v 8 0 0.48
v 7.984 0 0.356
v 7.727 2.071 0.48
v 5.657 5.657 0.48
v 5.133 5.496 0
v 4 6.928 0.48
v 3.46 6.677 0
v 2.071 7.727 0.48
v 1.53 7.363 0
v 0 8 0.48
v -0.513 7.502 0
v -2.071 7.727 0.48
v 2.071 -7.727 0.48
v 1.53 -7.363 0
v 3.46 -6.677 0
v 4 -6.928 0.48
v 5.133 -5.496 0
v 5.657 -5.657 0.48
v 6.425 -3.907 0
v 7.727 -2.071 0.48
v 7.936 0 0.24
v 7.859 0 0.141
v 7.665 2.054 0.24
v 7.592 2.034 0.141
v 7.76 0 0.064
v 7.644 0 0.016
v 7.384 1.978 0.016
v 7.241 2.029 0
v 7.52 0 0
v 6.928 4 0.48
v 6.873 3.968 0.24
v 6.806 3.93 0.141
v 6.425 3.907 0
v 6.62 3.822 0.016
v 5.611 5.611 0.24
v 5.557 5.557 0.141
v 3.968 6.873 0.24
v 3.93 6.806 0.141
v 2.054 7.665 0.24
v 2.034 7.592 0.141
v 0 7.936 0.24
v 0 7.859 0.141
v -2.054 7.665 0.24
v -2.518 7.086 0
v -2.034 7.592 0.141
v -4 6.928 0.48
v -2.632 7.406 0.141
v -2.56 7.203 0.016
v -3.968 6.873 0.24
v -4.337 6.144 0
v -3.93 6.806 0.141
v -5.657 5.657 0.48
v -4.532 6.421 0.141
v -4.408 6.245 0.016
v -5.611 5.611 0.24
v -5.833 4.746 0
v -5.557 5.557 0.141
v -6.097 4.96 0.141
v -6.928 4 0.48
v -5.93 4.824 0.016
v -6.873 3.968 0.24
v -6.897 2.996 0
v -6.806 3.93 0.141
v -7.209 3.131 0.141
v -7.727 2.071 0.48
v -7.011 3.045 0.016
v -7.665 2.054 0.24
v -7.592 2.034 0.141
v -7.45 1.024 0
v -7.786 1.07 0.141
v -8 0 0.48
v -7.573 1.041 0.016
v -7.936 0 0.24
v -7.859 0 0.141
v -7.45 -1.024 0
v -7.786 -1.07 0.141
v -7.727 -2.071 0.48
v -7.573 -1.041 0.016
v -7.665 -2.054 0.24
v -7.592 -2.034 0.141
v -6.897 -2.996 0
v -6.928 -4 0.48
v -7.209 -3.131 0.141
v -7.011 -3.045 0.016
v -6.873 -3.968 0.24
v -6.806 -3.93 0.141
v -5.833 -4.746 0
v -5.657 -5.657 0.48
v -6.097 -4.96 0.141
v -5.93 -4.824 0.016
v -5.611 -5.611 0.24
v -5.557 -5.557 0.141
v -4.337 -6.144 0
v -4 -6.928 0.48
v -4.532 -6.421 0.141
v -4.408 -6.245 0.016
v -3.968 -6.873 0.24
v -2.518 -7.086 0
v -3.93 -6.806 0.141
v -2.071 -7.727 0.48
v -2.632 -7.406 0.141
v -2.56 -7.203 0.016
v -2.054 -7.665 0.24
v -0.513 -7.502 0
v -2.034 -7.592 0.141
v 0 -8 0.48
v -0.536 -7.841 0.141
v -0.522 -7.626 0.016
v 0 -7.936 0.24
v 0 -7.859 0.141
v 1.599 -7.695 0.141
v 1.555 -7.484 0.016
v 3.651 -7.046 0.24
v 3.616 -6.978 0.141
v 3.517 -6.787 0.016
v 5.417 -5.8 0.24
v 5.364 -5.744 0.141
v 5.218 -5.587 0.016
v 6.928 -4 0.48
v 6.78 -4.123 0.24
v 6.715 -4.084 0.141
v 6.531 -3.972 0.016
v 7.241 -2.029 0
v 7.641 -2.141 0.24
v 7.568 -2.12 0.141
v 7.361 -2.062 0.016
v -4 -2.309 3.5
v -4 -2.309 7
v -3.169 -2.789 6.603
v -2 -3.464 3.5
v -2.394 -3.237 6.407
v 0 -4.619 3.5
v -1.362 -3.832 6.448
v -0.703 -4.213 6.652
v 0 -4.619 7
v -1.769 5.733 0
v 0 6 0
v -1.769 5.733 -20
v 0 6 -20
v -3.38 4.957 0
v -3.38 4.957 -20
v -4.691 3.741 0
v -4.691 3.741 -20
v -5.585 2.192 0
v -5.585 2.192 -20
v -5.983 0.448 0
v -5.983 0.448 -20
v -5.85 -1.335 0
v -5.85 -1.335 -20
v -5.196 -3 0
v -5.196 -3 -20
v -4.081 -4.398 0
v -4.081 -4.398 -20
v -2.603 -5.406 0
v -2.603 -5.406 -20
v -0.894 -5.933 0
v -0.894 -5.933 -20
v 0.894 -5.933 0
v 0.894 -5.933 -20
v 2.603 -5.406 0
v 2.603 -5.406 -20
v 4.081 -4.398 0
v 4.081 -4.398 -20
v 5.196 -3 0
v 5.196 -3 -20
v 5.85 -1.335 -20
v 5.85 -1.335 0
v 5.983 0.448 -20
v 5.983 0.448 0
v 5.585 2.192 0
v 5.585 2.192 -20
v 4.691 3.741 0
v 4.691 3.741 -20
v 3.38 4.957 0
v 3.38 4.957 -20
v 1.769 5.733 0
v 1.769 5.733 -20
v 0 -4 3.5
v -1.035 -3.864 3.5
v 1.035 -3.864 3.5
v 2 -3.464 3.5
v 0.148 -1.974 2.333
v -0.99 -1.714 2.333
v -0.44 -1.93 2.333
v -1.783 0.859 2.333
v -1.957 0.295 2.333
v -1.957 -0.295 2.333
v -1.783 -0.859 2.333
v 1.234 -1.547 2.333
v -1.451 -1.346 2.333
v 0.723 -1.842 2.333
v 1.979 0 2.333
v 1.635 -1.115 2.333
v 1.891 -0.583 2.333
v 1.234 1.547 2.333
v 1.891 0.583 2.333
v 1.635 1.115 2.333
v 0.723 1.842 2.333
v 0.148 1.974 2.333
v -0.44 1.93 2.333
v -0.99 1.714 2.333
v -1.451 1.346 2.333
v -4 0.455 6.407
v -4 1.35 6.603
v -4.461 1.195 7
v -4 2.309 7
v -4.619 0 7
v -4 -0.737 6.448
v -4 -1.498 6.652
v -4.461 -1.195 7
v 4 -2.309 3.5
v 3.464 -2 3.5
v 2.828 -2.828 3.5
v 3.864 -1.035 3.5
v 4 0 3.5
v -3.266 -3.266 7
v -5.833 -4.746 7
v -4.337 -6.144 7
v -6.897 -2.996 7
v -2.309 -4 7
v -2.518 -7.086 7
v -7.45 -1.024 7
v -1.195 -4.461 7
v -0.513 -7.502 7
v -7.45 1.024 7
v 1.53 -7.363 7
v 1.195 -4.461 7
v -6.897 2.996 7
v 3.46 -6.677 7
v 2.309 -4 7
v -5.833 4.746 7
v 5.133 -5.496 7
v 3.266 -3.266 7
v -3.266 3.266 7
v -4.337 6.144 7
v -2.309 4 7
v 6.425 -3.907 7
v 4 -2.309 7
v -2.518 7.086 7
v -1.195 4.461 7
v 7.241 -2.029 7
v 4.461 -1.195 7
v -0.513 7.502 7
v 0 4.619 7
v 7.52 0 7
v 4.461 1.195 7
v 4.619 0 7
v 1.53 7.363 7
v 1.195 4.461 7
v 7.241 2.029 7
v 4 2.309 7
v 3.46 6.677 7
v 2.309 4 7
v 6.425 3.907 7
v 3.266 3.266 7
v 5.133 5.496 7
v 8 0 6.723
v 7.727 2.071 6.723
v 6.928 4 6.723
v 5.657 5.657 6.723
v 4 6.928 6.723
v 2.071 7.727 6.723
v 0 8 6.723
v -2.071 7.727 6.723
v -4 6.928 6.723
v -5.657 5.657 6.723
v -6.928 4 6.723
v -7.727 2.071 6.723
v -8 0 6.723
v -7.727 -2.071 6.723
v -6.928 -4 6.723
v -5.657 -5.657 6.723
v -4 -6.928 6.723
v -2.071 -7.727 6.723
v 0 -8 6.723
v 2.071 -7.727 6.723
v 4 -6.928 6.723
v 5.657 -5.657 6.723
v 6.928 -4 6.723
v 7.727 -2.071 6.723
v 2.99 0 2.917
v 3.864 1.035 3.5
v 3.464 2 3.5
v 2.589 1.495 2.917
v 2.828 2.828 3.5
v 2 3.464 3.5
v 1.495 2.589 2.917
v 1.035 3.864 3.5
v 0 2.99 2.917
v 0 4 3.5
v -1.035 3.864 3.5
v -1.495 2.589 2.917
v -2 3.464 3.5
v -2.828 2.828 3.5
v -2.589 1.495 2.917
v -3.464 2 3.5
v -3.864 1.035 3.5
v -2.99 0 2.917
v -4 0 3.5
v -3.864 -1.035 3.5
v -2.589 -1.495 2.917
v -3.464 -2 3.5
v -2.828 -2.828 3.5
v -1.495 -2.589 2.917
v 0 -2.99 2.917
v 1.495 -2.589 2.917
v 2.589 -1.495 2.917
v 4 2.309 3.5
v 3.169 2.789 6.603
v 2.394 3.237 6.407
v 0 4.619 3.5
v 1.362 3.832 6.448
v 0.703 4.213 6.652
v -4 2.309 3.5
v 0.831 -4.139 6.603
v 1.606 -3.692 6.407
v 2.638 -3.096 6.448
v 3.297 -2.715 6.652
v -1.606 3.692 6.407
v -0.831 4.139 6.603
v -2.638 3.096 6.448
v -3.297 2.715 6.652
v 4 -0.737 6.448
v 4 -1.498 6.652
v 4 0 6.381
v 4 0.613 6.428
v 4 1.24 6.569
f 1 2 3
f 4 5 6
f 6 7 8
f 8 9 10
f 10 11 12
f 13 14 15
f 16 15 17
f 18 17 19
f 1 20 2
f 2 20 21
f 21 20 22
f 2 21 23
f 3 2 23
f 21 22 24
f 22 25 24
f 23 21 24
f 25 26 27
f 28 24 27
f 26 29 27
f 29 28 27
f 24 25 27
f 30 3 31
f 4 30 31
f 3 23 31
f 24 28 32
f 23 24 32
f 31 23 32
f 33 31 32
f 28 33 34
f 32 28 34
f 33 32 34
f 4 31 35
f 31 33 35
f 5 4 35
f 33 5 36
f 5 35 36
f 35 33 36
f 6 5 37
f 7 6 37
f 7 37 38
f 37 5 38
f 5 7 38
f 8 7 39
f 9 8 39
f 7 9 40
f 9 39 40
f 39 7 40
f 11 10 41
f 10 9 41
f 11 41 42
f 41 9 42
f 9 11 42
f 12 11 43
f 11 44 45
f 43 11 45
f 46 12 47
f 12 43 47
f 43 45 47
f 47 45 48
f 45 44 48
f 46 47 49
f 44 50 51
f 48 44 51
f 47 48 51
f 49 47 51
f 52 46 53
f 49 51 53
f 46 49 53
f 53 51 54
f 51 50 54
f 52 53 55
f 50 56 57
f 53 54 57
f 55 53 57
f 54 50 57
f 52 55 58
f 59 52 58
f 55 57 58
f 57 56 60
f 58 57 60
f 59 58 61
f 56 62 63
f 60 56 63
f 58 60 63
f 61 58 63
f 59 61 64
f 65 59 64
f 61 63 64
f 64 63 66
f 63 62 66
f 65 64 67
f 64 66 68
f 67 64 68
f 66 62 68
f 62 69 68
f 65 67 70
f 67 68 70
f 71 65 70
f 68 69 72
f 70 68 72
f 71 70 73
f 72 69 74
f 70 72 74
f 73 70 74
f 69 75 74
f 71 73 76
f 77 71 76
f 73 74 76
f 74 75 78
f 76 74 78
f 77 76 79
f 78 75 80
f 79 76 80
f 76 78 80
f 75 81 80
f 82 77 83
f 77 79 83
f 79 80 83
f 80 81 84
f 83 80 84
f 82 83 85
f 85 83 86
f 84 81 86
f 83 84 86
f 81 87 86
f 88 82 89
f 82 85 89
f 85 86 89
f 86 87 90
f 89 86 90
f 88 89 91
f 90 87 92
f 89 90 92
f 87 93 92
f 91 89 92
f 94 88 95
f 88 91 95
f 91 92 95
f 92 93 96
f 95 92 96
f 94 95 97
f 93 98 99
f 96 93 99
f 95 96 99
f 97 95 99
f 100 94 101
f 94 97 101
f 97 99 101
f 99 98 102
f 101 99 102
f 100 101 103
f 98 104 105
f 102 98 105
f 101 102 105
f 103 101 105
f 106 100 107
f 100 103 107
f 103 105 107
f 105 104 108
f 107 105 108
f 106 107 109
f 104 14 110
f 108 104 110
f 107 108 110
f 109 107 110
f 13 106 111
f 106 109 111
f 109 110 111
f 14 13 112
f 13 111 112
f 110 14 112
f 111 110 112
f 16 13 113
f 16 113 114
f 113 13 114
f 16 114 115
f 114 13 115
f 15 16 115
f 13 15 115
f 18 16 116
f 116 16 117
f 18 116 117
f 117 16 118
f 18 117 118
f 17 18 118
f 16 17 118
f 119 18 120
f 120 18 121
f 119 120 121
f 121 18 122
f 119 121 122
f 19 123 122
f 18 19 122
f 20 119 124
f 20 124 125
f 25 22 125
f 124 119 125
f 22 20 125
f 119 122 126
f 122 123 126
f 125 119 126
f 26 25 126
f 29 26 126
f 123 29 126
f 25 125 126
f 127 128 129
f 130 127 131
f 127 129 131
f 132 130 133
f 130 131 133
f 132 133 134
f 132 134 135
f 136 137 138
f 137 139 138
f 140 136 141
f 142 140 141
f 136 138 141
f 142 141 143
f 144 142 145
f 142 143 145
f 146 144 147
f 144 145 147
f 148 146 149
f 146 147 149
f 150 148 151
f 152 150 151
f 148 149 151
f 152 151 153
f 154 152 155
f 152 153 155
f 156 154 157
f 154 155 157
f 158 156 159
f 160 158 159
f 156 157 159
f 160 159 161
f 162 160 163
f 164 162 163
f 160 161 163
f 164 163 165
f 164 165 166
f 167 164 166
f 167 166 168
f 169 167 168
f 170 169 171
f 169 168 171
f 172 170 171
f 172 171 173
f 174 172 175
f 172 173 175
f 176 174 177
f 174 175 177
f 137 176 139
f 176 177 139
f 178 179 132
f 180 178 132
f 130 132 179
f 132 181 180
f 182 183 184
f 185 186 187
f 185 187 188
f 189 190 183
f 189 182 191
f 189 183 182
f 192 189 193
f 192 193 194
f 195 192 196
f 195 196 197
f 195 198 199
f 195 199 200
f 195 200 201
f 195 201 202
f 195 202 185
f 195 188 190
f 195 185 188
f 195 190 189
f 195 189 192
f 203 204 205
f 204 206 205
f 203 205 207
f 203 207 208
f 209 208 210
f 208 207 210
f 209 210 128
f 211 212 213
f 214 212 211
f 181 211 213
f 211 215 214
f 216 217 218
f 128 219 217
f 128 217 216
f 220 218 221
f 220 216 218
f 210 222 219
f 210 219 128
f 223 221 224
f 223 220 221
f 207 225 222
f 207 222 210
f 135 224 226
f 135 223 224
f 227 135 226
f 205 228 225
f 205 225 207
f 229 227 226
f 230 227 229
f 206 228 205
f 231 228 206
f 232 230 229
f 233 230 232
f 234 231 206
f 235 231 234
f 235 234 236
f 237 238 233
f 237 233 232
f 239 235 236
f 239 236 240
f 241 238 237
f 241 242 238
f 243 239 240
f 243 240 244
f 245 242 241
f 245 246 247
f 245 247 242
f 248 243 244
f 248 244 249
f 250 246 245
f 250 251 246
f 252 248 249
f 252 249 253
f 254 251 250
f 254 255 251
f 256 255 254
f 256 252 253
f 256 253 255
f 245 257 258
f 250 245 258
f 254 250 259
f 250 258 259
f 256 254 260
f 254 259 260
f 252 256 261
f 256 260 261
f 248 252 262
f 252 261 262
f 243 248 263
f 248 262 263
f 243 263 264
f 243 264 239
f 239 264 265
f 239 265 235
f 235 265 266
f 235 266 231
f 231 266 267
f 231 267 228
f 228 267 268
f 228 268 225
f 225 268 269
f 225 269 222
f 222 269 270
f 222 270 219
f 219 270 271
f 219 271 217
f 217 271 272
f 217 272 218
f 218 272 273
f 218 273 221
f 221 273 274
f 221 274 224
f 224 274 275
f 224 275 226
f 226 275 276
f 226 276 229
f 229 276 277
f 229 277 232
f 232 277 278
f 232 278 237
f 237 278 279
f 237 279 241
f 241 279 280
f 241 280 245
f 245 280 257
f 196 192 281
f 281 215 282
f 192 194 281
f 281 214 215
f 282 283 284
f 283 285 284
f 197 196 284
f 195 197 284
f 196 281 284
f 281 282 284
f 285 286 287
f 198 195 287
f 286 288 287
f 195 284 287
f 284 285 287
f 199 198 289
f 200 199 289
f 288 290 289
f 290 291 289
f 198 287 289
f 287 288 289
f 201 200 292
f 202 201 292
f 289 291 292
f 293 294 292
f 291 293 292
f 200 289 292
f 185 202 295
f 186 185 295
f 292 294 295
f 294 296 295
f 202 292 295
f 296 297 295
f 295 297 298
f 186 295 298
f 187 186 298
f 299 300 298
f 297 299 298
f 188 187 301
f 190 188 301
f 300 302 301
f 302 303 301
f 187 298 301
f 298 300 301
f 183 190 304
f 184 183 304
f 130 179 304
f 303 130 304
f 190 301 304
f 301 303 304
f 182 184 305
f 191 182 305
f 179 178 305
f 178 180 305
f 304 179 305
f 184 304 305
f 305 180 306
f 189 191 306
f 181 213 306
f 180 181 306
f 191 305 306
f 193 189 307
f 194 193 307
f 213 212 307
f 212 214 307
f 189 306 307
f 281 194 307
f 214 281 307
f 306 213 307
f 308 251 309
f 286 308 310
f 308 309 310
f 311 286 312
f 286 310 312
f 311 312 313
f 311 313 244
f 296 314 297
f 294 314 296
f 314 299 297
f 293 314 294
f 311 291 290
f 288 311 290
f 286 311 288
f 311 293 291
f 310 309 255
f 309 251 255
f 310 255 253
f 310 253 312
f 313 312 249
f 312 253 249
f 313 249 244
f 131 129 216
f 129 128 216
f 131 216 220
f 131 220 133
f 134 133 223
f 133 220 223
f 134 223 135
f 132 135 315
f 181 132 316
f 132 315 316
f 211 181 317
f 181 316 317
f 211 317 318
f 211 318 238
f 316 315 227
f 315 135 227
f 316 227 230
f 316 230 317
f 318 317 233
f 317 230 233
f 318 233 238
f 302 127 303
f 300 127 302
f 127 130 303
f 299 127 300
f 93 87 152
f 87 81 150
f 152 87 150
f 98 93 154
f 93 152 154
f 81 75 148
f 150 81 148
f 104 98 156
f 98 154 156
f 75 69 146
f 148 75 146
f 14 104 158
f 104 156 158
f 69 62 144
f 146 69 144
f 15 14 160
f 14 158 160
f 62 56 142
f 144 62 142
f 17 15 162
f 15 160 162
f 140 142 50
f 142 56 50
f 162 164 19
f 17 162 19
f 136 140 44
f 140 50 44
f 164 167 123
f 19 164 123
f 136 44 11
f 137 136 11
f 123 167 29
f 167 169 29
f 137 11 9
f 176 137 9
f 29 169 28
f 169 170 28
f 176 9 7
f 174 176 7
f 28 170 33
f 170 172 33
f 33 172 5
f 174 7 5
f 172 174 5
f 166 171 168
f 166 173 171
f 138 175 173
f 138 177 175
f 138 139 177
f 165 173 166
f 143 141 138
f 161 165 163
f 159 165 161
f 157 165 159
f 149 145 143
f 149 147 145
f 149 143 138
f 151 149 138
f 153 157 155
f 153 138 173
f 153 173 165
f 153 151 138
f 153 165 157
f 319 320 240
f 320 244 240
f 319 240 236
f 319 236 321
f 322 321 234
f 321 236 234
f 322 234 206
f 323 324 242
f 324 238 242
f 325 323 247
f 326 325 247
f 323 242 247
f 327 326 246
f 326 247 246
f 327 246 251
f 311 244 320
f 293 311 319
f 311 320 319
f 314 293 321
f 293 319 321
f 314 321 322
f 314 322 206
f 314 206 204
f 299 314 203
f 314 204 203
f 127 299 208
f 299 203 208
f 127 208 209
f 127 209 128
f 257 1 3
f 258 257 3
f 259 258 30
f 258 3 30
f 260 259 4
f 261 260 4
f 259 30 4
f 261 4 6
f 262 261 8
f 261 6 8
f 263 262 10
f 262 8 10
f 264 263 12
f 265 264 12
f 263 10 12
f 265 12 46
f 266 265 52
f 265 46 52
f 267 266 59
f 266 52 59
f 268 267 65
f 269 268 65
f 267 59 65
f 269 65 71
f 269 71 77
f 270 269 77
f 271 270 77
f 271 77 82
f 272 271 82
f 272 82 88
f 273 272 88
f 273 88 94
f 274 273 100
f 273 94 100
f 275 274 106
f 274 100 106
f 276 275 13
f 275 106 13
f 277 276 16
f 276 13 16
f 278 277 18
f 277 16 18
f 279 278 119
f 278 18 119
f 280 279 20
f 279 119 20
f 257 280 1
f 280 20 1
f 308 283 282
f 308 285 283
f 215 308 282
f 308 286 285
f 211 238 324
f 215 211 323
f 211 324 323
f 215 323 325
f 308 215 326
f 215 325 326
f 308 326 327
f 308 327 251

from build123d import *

# Parameters (mm, degrees)
SKETCH1_W          = 20
SKETCH1_H          = 6
SKETCH4_R          = 8
EXTRUDE1_DEPTH     = 7
FILLET1_R          = 0.48
CHAMFER1_SIZE      = 0.48
CHAMFER1_SIZE2     = 0.277128129
CUT_EXTRUDE1_DEPTH = 3.5
SKETCH7_R          = 4.618802154
CUT_EXTRUDE4_DEPTH = 3.5
CUT_EXTRUDE4_DRAFT = -45
SKETCH8_R          = 4
CUT_EXTRUDE5_DEPTH = 1.166666667
CUT_EXTRUDE5_DRAFT = -60


with BuildPart() as part:
    # Sketch1 → Revolve1 (revolve)
    with BuildSketch(Plane(origin=(0, 0, 0), x_dir=(0, 0, -1), z_dir=(1, 0, 0))):
        with Locations((10, 3)):
            Rectangle(SKETCH1_W, SKETCH1_H)
    revolve(axis=Axis((0, 0, 0), (0, 0, 1)))

    # Sketch4 → Extrude1 (add)
    with BuildSketch(Plane.XY):
        Circle(SKETCH4_R)
    extrude(amount=EXTRUDE1_DEPTH)

    # Fillet1
    fillet1_edges = [part.edges().sort_by_distance(p)[0] for p in [
        (-8, 0, 0),
    ]]
    fillet(fillet1_edges, radius=FILLET1_R)

    # Chamfer1
    chamfer1_edges = [part.edges().sort_by_distance(p)[0] for p in [
        (-8, 0, 7),
    ]]
    chamfer1_side = [part.faces().sort_by_distance(p)[0] for p in [
        (0, 0, 7),
    ]]
    chamfer(chamfer1_edges, length=CHAMFER1_SIZE, length2=CHAMFER1_SIZE2, reference=chamfer1_side[0])

    # Sketch6 → Cut-Extrude1 (cut)
    with BuildSketch(Plane.XY.offset(7)):
        Polygon((0, -4.618802154), (4, -2.309401077), (4, 2.309401077), (0, 4.618802154), (-4, 2.309401077), (-4, -2.309401077), align=None)
    extrude(amount=-CUT_EXTRUDE1_DEPTH, mode=Mode.SUBTRACT)


with BuildPart() as cut_extrude4_tool:
    # Sketch7 → Cut-Extrude4 (with draft: the straight prism first)
    with BuildSketch(Plane.XY.offset(7)):
        Circle(SKETCH7_R)
    extrude(amount=-CUT_EXTRUDE4_DEPTH)
    # Cut-Extrude4: the draft: its side faces are tilted about the plane it starts from
    cut_extrude4_sides = [cut_extrude4_tool.faces().sort_by_distance(p)[0] for p in [
        (-4.618802154, 0, 5.25),
    ]]
    draft(cut_extrude4_sides, Plane.XY.offset(7), CUT_EXTRUDE4_DRAFT)


with BuildPart() as part_1:
    add(part.part)

    # Cut-Extrude4: cut by cut_extrude4_tool
    add(cut_extrude4_tool.part, mode=Mode.SUBTRACT)


with BuildPart() as cut_extrude5_tool:
    # Sketch8 → Cut-Extrude5 (with draft: the straight prism first)
    with BuildSketch(Plane.XY.offset(3.5)):
        Circle(SKETCH8_R)
    extrude(amount=-CUT_EXTRUDE5_DEPTH)
    # Cut-Extrude5: the draft: its side faces are tilted about the plane it starts from
    cut_extrude5_sides = [cut_extrude5_tool.faces().sort_by_distance(p)[0] for p in [
        (-4, 0, 2.916666667),
    ]]
    draft(cut_extrude5_sides, Plane.XY.offset(3.5), CUT_EXTRUDE5_DRAFT)


with BuildPart() as part_2:
    add(part_1.part)

    # Cut-Extrude5: cut by cut_extrude5_tool
    add(cut_extrude5_tool.part, mode=Mode.SUBTRACT)


solid = part_2.part
